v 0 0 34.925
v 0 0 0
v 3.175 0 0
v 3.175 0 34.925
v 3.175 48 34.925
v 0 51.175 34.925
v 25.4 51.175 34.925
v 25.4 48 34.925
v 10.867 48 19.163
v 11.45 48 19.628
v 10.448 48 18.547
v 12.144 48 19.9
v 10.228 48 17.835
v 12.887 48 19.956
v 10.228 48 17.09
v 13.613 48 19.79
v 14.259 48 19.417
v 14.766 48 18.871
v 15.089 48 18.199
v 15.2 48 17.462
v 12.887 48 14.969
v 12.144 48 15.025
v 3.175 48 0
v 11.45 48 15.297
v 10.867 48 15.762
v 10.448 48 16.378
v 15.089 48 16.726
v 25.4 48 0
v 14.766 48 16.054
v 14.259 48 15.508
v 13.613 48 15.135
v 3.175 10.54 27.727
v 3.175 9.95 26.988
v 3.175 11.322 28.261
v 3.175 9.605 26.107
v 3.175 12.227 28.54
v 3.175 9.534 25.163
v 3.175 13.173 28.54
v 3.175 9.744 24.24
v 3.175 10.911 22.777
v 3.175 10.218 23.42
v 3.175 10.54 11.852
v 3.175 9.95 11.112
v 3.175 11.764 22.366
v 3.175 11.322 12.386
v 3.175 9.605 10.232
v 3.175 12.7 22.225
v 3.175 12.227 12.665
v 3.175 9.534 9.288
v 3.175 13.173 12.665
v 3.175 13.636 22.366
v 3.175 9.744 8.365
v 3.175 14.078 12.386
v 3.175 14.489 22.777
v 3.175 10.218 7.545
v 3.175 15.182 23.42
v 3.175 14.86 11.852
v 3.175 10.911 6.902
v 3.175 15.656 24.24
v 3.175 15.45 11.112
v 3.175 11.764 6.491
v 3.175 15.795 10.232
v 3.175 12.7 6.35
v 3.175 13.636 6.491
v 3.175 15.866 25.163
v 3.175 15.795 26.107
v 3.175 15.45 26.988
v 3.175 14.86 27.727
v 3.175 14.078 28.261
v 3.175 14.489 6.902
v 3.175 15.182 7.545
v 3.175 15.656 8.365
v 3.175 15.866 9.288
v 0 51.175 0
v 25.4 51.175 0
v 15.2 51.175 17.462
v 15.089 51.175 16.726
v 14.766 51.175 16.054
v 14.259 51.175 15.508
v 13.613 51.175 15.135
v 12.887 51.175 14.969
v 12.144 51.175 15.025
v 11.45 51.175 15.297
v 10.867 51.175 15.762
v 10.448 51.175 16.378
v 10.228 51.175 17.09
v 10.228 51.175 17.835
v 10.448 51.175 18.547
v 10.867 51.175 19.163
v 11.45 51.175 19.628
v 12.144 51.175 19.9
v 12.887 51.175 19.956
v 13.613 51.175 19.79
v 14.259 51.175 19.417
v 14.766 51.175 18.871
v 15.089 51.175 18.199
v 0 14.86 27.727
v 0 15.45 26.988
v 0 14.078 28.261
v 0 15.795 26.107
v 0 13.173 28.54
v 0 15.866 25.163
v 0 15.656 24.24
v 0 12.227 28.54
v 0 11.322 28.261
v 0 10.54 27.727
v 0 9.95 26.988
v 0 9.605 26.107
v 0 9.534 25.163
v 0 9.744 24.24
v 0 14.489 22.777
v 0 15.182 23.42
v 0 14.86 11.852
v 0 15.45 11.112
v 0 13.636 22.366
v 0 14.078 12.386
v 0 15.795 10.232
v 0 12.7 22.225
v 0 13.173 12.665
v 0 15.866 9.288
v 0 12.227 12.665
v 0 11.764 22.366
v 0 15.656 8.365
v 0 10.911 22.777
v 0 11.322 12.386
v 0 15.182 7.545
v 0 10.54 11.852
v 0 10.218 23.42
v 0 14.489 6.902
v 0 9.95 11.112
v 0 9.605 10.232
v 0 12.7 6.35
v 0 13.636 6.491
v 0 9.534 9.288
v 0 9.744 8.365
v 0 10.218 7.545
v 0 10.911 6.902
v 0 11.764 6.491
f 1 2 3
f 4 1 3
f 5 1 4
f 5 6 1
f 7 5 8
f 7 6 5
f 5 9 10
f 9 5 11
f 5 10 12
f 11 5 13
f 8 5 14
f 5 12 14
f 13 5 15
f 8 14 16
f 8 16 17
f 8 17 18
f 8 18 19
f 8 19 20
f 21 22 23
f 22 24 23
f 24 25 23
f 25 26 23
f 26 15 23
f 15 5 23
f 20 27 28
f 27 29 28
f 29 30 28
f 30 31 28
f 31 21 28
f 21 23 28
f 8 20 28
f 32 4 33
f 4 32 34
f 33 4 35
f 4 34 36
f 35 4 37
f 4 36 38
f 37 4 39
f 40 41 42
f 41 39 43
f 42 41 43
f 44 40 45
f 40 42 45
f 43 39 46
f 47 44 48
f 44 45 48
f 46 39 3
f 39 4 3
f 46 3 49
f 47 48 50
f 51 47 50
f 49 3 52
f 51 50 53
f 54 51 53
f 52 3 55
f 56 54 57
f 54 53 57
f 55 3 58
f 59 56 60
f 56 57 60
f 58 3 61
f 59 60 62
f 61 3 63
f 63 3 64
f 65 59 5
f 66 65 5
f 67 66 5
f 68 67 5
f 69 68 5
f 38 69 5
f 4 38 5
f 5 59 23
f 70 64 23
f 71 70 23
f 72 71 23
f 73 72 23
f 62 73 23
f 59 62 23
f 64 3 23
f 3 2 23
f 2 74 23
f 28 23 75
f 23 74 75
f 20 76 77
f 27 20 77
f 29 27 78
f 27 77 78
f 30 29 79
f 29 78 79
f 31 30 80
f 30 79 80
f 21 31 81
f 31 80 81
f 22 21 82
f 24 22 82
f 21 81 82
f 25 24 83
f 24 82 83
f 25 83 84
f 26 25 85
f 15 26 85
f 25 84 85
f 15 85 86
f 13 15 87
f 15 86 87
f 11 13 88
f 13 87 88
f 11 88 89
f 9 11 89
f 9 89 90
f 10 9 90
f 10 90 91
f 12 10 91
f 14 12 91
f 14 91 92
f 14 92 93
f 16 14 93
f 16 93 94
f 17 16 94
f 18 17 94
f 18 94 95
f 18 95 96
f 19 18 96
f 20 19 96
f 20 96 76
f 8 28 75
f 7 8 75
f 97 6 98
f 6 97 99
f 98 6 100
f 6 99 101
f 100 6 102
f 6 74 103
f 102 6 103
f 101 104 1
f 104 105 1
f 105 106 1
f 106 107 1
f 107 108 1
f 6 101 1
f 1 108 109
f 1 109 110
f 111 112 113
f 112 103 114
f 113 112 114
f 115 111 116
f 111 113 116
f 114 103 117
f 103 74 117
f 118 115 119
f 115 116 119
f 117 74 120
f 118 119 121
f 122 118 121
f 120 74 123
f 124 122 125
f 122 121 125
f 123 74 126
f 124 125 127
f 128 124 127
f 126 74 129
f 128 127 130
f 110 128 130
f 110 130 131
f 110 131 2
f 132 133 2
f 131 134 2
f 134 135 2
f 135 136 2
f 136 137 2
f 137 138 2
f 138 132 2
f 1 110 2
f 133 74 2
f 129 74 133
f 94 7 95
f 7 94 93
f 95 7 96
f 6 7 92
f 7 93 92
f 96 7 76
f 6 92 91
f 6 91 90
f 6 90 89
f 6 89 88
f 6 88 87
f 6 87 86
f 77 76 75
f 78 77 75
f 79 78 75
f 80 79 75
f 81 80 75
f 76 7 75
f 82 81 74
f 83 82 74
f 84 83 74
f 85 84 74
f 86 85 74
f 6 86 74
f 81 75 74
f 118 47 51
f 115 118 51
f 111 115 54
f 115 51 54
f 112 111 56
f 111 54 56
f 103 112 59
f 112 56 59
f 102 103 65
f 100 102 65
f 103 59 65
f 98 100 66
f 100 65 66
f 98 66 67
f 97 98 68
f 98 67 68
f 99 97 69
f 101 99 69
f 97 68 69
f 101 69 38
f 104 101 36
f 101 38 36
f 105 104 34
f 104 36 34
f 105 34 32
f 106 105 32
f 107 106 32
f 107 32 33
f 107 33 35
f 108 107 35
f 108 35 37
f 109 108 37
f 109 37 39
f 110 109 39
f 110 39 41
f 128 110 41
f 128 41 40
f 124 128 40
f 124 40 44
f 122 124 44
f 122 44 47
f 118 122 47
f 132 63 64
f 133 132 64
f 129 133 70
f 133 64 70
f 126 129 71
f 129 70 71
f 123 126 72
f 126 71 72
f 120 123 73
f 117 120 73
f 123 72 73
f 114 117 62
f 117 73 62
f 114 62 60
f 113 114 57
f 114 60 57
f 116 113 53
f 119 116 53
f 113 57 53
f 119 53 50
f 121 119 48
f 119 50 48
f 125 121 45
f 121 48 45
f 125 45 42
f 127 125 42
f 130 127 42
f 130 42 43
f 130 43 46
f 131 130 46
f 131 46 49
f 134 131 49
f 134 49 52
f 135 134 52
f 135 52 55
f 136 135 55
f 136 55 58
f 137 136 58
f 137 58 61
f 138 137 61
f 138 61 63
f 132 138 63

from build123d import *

# Parameters (mm, degrees)
BOSS_EXTRUDE1_DEPTH = 34.925
SKETCH2_R           = 3.175
CUT_EXTRUDE1_DEPTH  = 4.175
SKETCH3_R           = 2.5
CUT_EXTRUDE2_DEPTH  = 52.175


with BuildPart() as part:
    # Sketch1 → Boss-Extrude1 (new body)
    with BuildSketch(Plane.XY):
        Polygon((0, 0), (3.175, 0), (3.175, 48), (25.4, 48), (25.4, 51.175), (0, 51.175), align=None)
    extrude(amount=BOSS_EXTRUDE1_DEPTH)

    # Sketch2 → Cut-Extrude1 (cut, through all)
    with BuildSketch(Plane(origin=(3.175, 0, 0), x_dir=(0, 0, -1), z_dir=(1, 0, 0))):
        with Locations((-25.4, 12.7)):
            Circle(SKETCH2_R)
        with Locations((-9.525, 12.7)):
            Circle(SKETCH2_R)
    extrude(amount=-CUT_EXTRUDE1_DEPTH, mode=Mode.SUBTRACT)

    # Sketch3 → Cut-Extrude2 (cut, through all)
    with BuildSketch(Plane(origin=(0, 51.175, 0), x_dir=(1, 0, 0), z_dir=(0, 1, 0))):
        with Locations((12.7, -17.4625)):
            Circle(SKETCH3_R)
    extrude(amount=-CUT_EXTRUDE2_DEPTH, mode=Mode.SUBTRACT)


solid = part.part
